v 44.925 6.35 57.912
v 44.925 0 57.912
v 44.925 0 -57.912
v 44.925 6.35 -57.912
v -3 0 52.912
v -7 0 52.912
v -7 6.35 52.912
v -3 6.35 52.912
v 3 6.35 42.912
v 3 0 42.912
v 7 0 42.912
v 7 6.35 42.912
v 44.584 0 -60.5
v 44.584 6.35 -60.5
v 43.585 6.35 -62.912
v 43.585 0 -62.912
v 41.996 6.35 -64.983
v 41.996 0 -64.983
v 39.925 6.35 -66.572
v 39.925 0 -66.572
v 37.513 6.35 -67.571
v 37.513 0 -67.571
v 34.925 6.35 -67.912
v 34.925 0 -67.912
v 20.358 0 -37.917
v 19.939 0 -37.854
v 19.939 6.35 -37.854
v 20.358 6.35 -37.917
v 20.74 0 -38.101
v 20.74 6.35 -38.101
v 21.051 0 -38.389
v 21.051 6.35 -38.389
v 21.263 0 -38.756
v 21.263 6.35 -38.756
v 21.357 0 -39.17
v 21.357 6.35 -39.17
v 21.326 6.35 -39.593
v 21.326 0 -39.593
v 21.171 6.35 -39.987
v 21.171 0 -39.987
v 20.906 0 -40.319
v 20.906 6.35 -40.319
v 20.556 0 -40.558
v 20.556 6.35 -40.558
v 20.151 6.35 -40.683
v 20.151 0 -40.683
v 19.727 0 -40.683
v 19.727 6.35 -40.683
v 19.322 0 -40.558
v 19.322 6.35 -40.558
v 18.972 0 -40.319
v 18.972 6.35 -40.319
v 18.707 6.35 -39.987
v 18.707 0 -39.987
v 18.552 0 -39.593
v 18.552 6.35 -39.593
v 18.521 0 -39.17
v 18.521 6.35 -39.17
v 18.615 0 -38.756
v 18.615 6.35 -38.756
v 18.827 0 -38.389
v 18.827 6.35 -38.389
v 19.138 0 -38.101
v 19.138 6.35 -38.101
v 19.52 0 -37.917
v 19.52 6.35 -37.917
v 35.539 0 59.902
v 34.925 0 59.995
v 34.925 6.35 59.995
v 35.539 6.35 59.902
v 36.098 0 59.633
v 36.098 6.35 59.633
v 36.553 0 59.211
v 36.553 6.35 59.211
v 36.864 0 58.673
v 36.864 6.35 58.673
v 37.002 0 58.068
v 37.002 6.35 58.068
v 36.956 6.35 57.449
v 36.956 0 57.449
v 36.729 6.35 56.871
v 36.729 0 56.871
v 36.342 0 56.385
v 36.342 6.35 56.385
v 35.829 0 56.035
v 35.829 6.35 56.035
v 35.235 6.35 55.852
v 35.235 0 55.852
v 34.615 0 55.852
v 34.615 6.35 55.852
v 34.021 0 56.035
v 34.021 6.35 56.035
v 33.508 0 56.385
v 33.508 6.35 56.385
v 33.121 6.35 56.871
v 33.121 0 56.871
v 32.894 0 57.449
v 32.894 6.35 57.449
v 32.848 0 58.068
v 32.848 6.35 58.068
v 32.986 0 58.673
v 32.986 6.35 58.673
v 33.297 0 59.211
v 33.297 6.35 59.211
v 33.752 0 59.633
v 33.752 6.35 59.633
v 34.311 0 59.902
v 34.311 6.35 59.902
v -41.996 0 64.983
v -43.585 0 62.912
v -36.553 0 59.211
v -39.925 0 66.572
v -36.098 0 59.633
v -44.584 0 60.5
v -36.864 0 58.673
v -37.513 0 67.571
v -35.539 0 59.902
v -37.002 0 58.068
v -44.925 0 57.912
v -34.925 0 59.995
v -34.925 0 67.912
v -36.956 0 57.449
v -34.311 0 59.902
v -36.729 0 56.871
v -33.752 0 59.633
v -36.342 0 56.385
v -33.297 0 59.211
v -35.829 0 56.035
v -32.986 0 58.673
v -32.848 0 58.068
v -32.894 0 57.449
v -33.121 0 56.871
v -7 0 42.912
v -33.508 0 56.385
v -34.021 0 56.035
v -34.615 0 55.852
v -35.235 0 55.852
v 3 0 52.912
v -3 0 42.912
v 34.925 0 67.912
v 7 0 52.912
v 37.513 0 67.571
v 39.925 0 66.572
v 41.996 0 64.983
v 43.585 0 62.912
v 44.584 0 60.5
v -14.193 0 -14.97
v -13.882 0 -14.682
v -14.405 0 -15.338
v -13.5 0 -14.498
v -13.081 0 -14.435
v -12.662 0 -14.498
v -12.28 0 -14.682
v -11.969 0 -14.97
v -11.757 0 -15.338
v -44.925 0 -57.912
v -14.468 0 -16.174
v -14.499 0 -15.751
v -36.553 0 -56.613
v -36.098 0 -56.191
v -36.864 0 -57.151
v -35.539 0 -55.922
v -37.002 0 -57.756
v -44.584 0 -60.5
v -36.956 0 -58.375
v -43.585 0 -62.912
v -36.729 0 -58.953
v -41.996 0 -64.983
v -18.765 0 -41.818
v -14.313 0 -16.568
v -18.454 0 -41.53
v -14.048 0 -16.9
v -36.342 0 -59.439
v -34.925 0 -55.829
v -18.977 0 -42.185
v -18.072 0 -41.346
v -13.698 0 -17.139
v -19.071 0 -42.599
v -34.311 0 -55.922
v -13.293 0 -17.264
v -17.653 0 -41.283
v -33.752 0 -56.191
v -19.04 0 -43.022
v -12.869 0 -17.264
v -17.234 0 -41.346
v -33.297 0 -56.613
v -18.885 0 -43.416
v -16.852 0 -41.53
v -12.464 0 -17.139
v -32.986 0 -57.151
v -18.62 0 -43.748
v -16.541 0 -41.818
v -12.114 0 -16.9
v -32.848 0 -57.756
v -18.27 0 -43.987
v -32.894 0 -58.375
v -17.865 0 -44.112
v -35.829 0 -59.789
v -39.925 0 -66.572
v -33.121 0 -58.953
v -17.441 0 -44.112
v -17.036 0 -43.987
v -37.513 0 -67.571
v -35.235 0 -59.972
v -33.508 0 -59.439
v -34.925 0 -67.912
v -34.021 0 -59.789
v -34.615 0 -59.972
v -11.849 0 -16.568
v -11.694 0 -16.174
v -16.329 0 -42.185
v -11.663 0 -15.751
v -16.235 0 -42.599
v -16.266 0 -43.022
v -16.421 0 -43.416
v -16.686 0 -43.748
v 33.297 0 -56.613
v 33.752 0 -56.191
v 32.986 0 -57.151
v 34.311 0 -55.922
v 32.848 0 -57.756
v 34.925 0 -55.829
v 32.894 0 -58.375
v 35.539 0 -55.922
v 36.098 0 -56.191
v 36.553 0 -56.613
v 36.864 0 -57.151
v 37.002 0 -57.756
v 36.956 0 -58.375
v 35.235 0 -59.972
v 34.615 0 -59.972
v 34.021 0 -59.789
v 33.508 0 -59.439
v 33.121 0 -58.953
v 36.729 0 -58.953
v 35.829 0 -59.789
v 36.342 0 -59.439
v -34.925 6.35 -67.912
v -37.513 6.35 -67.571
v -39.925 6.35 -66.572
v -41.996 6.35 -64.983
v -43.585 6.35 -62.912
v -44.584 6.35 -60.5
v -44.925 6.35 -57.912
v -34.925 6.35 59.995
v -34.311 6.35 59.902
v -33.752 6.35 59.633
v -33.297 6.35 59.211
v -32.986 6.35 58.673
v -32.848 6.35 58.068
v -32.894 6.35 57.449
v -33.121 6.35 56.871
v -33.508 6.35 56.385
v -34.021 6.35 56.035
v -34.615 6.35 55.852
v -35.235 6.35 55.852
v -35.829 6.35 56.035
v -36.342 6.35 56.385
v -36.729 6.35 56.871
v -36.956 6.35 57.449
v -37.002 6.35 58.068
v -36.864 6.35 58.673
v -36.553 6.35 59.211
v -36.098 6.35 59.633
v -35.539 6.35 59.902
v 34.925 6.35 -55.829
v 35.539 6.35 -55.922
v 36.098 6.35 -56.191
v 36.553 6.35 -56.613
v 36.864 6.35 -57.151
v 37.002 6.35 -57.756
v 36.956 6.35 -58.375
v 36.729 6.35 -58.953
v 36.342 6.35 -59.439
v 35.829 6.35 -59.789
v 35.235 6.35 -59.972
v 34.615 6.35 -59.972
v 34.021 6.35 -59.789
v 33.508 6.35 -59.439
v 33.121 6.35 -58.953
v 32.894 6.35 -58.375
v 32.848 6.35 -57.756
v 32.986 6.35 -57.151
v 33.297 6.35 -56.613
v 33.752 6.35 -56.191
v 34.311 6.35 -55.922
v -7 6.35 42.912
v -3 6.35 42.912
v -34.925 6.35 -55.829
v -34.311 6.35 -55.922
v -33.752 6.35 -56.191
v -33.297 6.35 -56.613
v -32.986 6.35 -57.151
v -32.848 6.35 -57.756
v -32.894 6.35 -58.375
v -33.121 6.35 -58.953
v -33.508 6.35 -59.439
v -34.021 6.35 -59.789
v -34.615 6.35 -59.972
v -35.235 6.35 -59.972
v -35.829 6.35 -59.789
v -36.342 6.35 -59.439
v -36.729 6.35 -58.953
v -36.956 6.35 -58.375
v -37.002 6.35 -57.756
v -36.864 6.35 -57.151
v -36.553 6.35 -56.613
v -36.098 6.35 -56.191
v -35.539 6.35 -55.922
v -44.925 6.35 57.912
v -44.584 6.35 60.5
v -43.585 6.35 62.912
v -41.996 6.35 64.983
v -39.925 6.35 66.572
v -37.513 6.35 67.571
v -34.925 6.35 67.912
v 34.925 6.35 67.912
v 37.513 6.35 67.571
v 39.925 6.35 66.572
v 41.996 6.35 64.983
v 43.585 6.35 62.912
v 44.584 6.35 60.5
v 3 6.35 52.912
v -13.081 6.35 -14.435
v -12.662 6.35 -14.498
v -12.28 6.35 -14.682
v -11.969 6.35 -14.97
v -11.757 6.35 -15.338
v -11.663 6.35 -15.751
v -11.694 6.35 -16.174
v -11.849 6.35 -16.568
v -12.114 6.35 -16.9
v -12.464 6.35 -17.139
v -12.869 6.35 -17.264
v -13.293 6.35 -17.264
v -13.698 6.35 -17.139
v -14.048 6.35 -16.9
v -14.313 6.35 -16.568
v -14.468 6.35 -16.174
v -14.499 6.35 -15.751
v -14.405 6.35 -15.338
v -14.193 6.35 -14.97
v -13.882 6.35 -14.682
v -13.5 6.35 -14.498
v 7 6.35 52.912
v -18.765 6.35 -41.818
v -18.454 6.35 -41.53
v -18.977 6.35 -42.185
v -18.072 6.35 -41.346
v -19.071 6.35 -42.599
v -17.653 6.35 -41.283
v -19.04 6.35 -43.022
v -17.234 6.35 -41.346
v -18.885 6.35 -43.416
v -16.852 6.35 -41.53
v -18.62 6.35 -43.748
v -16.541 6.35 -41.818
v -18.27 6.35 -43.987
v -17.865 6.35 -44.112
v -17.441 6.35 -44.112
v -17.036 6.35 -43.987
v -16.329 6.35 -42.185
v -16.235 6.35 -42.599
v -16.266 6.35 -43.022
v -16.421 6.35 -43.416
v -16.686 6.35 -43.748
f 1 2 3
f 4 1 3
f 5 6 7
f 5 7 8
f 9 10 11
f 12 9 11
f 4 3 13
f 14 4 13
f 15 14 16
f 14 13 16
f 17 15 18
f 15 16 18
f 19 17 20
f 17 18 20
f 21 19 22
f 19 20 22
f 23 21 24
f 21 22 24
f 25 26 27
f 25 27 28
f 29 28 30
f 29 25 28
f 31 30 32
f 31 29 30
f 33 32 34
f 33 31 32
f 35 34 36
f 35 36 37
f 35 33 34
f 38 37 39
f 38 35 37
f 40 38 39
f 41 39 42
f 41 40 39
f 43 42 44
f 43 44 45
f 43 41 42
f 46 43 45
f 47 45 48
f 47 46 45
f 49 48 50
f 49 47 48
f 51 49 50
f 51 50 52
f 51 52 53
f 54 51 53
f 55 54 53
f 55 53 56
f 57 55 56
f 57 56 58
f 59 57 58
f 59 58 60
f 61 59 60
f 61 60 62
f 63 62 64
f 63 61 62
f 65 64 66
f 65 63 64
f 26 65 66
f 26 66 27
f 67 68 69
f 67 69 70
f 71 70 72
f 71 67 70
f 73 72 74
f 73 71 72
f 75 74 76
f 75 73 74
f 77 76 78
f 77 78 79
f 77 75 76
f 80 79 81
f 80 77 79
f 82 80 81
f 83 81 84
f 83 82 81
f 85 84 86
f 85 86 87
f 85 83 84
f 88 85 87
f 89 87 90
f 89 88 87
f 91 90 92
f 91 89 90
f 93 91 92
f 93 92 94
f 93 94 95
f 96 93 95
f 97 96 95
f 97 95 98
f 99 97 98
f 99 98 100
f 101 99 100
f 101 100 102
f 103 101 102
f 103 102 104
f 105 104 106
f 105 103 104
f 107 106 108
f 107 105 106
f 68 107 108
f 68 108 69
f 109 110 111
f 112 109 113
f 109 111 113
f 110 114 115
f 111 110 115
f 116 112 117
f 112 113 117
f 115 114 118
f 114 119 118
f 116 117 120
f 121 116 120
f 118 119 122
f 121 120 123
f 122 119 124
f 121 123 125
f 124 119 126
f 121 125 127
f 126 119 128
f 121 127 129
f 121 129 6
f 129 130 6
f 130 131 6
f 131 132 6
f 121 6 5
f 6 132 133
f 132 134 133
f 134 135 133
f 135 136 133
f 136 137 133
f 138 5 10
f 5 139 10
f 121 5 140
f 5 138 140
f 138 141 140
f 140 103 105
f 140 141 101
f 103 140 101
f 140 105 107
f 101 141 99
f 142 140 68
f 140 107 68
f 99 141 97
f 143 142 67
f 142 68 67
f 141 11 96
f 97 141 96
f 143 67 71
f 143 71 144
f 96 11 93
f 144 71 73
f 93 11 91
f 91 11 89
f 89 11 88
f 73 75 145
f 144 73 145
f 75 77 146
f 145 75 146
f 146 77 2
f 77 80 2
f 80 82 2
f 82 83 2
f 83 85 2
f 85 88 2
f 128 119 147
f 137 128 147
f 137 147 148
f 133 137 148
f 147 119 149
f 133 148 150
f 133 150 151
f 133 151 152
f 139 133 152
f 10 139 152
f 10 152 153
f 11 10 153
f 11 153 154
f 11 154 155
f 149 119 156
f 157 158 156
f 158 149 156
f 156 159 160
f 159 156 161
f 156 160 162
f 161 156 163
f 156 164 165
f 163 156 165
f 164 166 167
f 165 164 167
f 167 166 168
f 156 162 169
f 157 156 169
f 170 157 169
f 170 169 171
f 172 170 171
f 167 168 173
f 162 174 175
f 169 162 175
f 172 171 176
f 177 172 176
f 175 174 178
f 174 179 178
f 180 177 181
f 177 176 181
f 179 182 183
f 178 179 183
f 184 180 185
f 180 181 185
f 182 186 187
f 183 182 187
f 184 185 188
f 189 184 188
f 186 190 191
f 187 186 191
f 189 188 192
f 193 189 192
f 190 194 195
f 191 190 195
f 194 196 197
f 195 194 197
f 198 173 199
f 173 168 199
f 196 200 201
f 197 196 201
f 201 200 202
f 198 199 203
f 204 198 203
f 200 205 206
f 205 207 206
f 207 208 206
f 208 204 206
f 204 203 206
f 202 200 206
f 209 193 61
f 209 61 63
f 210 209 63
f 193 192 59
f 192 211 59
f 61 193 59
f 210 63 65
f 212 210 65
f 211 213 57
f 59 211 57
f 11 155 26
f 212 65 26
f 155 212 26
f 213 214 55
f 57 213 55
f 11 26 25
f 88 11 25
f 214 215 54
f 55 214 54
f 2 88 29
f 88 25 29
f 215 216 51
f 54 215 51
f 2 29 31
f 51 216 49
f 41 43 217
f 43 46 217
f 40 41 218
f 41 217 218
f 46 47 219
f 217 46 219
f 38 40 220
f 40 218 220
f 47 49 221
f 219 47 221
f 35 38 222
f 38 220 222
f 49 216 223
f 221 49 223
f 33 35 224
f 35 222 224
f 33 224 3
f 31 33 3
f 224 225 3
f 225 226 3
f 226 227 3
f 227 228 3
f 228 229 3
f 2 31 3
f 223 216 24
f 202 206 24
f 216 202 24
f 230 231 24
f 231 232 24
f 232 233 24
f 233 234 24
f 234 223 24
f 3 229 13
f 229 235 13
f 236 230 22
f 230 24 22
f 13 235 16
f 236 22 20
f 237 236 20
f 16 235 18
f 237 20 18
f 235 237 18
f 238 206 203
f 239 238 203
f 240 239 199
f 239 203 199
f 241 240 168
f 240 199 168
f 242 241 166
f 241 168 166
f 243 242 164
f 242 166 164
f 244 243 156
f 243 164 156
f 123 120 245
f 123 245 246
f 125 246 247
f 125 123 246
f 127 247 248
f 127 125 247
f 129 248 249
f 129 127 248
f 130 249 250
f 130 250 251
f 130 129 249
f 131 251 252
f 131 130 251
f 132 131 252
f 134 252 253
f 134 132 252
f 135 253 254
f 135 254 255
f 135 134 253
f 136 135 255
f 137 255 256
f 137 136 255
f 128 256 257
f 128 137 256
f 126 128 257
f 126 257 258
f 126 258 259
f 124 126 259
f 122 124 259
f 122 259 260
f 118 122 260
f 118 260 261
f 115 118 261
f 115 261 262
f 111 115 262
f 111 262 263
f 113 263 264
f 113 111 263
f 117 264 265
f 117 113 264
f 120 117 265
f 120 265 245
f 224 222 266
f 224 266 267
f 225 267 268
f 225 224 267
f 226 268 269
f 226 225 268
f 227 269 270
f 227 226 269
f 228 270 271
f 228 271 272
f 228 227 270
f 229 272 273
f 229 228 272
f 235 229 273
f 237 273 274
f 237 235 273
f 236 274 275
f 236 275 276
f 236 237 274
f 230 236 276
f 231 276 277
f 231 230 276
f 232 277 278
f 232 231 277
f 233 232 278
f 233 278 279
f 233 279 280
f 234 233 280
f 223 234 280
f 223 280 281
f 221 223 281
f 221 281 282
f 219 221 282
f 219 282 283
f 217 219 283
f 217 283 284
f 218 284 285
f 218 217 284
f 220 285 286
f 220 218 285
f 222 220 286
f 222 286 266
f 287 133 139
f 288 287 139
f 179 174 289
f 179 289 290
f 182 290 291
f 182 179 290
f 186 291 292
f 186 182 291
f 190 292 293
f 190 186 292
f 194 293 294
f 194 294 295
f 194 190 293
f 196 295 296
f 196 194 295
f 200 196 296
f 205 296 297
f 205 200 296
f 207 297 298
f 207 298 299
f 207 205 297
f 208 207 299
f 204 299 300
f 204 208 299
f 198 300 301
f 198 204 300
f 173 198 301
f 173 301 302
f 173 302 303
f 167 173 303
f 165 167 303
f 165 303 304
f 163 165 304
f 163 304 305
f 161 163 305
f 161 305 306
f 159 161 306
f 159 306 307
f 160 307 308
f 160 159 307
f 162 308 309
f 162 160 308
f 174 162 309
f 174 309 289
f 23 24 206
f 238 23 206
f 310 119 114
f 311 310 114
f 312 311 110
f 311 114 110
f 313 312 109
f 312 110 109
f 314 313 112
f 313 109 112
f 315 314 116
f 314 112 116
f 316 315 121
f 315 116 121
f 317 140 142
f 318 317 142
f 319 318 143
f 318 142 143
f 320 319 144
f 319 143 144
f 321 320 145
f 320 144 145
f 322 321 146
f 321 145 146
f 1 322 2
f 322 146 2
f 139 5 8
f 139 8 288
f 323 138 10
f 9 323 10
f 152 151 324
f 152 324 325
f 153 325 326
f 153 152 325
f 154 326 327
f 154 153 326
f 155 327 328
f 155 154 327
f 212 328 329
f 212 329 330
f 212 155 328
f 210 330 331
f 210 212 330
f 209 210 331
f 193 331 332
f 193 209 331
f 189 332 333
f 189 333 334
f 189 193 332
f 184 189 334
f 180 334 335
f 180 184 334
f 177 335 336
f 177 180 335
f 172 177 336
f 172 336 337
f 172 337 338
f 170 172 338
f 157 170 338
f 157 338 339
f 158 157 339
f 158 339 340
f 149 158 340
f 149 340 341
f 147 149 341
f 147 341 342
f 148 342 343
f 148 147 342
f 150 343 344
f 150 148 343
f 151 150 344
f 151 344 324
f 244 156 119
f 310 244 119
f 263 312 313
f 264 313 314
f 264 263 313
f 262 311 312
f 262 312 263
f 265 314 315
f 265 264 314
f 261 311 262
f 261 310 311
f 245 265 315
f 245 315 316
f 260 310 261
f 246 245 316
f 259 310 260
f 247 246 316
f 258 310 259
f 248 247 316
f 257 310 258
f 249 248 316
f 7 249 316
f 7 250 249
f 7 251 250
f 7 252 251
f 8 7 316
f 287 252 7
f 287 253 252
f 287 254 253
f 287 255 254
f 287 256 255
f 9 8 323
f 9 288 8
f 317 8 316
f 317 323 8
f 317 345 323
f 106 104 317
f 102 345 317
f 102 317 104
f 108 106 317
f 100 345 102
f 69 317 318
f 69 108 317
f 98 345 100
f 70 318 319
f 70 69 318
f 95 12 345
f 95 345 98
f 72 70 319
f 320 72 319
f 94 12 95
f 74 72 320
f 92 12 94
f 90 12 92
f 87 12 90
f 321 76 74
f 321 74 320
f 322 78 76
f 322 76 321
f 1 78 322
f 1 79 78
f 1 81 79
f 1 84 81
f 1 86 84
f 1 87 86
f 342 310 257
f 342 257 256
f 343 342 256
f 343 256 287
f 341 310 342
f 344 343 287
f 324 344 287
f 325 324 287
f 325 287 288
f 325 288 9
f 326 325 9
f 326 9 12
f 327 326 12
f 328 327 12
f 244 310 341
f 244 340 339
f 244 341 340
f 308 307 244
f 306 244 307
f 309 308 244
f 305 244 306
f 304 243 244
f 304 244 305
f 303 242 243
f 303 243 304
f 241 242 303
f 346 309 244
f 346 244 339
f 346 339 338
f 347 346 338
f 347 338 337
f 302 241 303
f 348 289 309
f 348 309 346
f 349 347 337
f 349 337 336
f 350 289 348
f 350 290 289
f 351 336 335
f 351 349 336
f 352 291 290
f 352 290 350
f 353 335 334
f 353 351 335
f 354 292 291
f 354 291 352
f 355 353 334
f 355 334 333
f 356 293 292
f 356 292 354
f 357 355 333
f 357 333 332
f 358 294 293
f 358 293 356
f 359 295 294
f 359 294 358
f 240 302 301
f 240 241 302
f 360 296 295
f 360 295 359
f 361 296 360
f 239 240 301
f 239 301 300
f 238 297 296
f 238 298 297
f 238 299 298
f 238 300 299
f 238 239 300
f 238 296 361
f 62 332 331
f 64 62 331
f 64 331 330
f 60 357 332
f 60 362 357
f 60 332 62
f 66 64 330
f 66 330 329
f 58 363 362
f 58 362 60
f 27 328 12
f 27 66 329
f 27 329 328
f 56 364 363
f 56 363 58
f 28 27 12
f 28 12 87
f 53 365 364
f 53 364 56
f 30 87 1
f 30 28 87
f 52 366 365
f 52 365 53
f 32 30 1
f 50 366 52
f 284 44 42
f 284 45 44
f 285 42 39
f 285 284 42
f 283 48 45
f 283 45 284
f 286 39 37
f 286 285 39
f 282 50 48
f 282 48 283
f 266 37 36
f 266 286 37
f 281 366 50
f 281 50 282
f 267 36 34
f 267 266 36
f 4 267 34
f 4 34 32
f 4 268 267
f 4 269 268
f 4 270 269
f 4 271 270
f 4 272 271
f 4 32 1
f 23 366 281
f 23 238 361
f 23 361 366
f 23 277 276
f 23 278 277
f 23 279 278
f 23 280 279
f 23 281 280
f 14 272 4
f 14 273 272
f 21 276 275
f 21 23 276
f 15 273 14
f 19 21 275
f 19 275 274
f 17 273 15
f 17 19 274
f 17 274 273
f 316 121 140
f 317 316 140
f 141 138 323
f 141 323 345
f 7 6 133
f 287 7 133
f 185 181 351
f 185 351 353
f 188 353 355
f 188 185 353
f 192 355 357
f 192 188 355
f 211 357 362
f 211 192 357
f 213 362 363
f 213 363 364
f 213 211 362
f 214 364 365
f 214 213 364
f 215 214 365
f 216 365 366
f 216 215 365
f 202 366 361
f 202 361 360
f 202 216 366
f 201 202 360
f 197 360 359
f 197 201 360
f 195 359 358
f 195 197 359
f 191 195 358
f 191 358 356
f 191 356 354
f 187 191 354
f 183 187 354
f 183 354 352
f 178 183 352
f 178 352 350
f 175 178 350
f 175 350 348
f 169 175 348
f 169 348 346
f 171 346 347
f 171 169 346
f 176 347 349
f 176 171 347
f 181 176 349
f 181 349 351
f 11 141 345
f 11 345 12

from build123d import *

# Parameters (mm, degrees)
SKETCH1_R           = 2.0828
SKETCH1_R_2         = 1.4224
SKETCH1_W           = 4
SKETCH1_H           = 10
BOSS_EXTRUDE1_DEPTH = 6.35


with BuildPart() as part:
    # Sketch1 → Boss-Extrude1 (new body)
    with BuildSketch(Plane(origin=(0, 0, 0), x_dir=(1, 0, 0), z_dir=(0, 1, 0))):
        with BuildLine():
            Line((-34.925, -67.912), (34.925, -67.912))
            ThreePointArc((34.925, -67.912), (41.996067812, -64.983067812), (44.925, -57.912))
            Line((44.925, -57.912), (44.925, 57.912))
            ThreePointArc((44.925, 57.912), (41.996067812, 64.983067812), (34.925, 67.912))
            Line((34.925, 67.912), (-34.925, 67.912))
            ThreePointArc((-34.925, 67.912), (-41.996067812, 64.983067812), (-44.925, 57.912))
            Line((-44.925, 57.912), (-44.925, -57.912))
            ThreePointArc((-44.925, -57.912), (-41.996067812, -64.983067812), (-34.925, -67.912))
        make_face()
        with Locations(Location((-34.925, 57.912, 0), (0, 0, 270))):
            Circle(SKETCH1_R, mode=Mode.SUBTRACT)
        with Locations(Location((34.925, 57.912, 0), (0, 0, 270))):
            Circle(SKETCH1_R, mode=Mode.SUBTRACT)
        with Locations(Location((34.925, -57.912, 0), (0, 0, 270))):
            Circle(SKETCH1_R, mode=Mode.SUBTRACT)
        with Locations(Location((-34.925, -57.912, 0), (0, 0, 270))):
            Circle(SKETCH1_R, mode=Mode.SUBTRACT)
        with Locations(Location((19.939, 39.276, 0), (0, 0, 270))):
            Circle(SKETCH1_R_2, mode=Mode.SUBTRACT)
        with Locations(Location((-13.081, 15.8572, 0), (0, 0, 270))):
            Circle(SKETCH1_R_2, mode=Mode.SUBTRACT)
        with Locations(Location((-17.653, 42.705, 0), (0, 0, 270))):
            Circle(SKETCH1_R_2, mode=Mode.SUBTRACT)
        with Locations((-5, -47.912)):
            Rectangle(SKETCH1_W, SKETCH1_H, mode=Mode.SUBTRACT)
        with Locations((5, -47.912)):
            Rectangle(SKETCH1_W, SKETCH1_H, mode=Mode.SUBTRACT)
    extrude(amount=BOSS_EXTRUDE1_DEPTH)


solid = part.part
